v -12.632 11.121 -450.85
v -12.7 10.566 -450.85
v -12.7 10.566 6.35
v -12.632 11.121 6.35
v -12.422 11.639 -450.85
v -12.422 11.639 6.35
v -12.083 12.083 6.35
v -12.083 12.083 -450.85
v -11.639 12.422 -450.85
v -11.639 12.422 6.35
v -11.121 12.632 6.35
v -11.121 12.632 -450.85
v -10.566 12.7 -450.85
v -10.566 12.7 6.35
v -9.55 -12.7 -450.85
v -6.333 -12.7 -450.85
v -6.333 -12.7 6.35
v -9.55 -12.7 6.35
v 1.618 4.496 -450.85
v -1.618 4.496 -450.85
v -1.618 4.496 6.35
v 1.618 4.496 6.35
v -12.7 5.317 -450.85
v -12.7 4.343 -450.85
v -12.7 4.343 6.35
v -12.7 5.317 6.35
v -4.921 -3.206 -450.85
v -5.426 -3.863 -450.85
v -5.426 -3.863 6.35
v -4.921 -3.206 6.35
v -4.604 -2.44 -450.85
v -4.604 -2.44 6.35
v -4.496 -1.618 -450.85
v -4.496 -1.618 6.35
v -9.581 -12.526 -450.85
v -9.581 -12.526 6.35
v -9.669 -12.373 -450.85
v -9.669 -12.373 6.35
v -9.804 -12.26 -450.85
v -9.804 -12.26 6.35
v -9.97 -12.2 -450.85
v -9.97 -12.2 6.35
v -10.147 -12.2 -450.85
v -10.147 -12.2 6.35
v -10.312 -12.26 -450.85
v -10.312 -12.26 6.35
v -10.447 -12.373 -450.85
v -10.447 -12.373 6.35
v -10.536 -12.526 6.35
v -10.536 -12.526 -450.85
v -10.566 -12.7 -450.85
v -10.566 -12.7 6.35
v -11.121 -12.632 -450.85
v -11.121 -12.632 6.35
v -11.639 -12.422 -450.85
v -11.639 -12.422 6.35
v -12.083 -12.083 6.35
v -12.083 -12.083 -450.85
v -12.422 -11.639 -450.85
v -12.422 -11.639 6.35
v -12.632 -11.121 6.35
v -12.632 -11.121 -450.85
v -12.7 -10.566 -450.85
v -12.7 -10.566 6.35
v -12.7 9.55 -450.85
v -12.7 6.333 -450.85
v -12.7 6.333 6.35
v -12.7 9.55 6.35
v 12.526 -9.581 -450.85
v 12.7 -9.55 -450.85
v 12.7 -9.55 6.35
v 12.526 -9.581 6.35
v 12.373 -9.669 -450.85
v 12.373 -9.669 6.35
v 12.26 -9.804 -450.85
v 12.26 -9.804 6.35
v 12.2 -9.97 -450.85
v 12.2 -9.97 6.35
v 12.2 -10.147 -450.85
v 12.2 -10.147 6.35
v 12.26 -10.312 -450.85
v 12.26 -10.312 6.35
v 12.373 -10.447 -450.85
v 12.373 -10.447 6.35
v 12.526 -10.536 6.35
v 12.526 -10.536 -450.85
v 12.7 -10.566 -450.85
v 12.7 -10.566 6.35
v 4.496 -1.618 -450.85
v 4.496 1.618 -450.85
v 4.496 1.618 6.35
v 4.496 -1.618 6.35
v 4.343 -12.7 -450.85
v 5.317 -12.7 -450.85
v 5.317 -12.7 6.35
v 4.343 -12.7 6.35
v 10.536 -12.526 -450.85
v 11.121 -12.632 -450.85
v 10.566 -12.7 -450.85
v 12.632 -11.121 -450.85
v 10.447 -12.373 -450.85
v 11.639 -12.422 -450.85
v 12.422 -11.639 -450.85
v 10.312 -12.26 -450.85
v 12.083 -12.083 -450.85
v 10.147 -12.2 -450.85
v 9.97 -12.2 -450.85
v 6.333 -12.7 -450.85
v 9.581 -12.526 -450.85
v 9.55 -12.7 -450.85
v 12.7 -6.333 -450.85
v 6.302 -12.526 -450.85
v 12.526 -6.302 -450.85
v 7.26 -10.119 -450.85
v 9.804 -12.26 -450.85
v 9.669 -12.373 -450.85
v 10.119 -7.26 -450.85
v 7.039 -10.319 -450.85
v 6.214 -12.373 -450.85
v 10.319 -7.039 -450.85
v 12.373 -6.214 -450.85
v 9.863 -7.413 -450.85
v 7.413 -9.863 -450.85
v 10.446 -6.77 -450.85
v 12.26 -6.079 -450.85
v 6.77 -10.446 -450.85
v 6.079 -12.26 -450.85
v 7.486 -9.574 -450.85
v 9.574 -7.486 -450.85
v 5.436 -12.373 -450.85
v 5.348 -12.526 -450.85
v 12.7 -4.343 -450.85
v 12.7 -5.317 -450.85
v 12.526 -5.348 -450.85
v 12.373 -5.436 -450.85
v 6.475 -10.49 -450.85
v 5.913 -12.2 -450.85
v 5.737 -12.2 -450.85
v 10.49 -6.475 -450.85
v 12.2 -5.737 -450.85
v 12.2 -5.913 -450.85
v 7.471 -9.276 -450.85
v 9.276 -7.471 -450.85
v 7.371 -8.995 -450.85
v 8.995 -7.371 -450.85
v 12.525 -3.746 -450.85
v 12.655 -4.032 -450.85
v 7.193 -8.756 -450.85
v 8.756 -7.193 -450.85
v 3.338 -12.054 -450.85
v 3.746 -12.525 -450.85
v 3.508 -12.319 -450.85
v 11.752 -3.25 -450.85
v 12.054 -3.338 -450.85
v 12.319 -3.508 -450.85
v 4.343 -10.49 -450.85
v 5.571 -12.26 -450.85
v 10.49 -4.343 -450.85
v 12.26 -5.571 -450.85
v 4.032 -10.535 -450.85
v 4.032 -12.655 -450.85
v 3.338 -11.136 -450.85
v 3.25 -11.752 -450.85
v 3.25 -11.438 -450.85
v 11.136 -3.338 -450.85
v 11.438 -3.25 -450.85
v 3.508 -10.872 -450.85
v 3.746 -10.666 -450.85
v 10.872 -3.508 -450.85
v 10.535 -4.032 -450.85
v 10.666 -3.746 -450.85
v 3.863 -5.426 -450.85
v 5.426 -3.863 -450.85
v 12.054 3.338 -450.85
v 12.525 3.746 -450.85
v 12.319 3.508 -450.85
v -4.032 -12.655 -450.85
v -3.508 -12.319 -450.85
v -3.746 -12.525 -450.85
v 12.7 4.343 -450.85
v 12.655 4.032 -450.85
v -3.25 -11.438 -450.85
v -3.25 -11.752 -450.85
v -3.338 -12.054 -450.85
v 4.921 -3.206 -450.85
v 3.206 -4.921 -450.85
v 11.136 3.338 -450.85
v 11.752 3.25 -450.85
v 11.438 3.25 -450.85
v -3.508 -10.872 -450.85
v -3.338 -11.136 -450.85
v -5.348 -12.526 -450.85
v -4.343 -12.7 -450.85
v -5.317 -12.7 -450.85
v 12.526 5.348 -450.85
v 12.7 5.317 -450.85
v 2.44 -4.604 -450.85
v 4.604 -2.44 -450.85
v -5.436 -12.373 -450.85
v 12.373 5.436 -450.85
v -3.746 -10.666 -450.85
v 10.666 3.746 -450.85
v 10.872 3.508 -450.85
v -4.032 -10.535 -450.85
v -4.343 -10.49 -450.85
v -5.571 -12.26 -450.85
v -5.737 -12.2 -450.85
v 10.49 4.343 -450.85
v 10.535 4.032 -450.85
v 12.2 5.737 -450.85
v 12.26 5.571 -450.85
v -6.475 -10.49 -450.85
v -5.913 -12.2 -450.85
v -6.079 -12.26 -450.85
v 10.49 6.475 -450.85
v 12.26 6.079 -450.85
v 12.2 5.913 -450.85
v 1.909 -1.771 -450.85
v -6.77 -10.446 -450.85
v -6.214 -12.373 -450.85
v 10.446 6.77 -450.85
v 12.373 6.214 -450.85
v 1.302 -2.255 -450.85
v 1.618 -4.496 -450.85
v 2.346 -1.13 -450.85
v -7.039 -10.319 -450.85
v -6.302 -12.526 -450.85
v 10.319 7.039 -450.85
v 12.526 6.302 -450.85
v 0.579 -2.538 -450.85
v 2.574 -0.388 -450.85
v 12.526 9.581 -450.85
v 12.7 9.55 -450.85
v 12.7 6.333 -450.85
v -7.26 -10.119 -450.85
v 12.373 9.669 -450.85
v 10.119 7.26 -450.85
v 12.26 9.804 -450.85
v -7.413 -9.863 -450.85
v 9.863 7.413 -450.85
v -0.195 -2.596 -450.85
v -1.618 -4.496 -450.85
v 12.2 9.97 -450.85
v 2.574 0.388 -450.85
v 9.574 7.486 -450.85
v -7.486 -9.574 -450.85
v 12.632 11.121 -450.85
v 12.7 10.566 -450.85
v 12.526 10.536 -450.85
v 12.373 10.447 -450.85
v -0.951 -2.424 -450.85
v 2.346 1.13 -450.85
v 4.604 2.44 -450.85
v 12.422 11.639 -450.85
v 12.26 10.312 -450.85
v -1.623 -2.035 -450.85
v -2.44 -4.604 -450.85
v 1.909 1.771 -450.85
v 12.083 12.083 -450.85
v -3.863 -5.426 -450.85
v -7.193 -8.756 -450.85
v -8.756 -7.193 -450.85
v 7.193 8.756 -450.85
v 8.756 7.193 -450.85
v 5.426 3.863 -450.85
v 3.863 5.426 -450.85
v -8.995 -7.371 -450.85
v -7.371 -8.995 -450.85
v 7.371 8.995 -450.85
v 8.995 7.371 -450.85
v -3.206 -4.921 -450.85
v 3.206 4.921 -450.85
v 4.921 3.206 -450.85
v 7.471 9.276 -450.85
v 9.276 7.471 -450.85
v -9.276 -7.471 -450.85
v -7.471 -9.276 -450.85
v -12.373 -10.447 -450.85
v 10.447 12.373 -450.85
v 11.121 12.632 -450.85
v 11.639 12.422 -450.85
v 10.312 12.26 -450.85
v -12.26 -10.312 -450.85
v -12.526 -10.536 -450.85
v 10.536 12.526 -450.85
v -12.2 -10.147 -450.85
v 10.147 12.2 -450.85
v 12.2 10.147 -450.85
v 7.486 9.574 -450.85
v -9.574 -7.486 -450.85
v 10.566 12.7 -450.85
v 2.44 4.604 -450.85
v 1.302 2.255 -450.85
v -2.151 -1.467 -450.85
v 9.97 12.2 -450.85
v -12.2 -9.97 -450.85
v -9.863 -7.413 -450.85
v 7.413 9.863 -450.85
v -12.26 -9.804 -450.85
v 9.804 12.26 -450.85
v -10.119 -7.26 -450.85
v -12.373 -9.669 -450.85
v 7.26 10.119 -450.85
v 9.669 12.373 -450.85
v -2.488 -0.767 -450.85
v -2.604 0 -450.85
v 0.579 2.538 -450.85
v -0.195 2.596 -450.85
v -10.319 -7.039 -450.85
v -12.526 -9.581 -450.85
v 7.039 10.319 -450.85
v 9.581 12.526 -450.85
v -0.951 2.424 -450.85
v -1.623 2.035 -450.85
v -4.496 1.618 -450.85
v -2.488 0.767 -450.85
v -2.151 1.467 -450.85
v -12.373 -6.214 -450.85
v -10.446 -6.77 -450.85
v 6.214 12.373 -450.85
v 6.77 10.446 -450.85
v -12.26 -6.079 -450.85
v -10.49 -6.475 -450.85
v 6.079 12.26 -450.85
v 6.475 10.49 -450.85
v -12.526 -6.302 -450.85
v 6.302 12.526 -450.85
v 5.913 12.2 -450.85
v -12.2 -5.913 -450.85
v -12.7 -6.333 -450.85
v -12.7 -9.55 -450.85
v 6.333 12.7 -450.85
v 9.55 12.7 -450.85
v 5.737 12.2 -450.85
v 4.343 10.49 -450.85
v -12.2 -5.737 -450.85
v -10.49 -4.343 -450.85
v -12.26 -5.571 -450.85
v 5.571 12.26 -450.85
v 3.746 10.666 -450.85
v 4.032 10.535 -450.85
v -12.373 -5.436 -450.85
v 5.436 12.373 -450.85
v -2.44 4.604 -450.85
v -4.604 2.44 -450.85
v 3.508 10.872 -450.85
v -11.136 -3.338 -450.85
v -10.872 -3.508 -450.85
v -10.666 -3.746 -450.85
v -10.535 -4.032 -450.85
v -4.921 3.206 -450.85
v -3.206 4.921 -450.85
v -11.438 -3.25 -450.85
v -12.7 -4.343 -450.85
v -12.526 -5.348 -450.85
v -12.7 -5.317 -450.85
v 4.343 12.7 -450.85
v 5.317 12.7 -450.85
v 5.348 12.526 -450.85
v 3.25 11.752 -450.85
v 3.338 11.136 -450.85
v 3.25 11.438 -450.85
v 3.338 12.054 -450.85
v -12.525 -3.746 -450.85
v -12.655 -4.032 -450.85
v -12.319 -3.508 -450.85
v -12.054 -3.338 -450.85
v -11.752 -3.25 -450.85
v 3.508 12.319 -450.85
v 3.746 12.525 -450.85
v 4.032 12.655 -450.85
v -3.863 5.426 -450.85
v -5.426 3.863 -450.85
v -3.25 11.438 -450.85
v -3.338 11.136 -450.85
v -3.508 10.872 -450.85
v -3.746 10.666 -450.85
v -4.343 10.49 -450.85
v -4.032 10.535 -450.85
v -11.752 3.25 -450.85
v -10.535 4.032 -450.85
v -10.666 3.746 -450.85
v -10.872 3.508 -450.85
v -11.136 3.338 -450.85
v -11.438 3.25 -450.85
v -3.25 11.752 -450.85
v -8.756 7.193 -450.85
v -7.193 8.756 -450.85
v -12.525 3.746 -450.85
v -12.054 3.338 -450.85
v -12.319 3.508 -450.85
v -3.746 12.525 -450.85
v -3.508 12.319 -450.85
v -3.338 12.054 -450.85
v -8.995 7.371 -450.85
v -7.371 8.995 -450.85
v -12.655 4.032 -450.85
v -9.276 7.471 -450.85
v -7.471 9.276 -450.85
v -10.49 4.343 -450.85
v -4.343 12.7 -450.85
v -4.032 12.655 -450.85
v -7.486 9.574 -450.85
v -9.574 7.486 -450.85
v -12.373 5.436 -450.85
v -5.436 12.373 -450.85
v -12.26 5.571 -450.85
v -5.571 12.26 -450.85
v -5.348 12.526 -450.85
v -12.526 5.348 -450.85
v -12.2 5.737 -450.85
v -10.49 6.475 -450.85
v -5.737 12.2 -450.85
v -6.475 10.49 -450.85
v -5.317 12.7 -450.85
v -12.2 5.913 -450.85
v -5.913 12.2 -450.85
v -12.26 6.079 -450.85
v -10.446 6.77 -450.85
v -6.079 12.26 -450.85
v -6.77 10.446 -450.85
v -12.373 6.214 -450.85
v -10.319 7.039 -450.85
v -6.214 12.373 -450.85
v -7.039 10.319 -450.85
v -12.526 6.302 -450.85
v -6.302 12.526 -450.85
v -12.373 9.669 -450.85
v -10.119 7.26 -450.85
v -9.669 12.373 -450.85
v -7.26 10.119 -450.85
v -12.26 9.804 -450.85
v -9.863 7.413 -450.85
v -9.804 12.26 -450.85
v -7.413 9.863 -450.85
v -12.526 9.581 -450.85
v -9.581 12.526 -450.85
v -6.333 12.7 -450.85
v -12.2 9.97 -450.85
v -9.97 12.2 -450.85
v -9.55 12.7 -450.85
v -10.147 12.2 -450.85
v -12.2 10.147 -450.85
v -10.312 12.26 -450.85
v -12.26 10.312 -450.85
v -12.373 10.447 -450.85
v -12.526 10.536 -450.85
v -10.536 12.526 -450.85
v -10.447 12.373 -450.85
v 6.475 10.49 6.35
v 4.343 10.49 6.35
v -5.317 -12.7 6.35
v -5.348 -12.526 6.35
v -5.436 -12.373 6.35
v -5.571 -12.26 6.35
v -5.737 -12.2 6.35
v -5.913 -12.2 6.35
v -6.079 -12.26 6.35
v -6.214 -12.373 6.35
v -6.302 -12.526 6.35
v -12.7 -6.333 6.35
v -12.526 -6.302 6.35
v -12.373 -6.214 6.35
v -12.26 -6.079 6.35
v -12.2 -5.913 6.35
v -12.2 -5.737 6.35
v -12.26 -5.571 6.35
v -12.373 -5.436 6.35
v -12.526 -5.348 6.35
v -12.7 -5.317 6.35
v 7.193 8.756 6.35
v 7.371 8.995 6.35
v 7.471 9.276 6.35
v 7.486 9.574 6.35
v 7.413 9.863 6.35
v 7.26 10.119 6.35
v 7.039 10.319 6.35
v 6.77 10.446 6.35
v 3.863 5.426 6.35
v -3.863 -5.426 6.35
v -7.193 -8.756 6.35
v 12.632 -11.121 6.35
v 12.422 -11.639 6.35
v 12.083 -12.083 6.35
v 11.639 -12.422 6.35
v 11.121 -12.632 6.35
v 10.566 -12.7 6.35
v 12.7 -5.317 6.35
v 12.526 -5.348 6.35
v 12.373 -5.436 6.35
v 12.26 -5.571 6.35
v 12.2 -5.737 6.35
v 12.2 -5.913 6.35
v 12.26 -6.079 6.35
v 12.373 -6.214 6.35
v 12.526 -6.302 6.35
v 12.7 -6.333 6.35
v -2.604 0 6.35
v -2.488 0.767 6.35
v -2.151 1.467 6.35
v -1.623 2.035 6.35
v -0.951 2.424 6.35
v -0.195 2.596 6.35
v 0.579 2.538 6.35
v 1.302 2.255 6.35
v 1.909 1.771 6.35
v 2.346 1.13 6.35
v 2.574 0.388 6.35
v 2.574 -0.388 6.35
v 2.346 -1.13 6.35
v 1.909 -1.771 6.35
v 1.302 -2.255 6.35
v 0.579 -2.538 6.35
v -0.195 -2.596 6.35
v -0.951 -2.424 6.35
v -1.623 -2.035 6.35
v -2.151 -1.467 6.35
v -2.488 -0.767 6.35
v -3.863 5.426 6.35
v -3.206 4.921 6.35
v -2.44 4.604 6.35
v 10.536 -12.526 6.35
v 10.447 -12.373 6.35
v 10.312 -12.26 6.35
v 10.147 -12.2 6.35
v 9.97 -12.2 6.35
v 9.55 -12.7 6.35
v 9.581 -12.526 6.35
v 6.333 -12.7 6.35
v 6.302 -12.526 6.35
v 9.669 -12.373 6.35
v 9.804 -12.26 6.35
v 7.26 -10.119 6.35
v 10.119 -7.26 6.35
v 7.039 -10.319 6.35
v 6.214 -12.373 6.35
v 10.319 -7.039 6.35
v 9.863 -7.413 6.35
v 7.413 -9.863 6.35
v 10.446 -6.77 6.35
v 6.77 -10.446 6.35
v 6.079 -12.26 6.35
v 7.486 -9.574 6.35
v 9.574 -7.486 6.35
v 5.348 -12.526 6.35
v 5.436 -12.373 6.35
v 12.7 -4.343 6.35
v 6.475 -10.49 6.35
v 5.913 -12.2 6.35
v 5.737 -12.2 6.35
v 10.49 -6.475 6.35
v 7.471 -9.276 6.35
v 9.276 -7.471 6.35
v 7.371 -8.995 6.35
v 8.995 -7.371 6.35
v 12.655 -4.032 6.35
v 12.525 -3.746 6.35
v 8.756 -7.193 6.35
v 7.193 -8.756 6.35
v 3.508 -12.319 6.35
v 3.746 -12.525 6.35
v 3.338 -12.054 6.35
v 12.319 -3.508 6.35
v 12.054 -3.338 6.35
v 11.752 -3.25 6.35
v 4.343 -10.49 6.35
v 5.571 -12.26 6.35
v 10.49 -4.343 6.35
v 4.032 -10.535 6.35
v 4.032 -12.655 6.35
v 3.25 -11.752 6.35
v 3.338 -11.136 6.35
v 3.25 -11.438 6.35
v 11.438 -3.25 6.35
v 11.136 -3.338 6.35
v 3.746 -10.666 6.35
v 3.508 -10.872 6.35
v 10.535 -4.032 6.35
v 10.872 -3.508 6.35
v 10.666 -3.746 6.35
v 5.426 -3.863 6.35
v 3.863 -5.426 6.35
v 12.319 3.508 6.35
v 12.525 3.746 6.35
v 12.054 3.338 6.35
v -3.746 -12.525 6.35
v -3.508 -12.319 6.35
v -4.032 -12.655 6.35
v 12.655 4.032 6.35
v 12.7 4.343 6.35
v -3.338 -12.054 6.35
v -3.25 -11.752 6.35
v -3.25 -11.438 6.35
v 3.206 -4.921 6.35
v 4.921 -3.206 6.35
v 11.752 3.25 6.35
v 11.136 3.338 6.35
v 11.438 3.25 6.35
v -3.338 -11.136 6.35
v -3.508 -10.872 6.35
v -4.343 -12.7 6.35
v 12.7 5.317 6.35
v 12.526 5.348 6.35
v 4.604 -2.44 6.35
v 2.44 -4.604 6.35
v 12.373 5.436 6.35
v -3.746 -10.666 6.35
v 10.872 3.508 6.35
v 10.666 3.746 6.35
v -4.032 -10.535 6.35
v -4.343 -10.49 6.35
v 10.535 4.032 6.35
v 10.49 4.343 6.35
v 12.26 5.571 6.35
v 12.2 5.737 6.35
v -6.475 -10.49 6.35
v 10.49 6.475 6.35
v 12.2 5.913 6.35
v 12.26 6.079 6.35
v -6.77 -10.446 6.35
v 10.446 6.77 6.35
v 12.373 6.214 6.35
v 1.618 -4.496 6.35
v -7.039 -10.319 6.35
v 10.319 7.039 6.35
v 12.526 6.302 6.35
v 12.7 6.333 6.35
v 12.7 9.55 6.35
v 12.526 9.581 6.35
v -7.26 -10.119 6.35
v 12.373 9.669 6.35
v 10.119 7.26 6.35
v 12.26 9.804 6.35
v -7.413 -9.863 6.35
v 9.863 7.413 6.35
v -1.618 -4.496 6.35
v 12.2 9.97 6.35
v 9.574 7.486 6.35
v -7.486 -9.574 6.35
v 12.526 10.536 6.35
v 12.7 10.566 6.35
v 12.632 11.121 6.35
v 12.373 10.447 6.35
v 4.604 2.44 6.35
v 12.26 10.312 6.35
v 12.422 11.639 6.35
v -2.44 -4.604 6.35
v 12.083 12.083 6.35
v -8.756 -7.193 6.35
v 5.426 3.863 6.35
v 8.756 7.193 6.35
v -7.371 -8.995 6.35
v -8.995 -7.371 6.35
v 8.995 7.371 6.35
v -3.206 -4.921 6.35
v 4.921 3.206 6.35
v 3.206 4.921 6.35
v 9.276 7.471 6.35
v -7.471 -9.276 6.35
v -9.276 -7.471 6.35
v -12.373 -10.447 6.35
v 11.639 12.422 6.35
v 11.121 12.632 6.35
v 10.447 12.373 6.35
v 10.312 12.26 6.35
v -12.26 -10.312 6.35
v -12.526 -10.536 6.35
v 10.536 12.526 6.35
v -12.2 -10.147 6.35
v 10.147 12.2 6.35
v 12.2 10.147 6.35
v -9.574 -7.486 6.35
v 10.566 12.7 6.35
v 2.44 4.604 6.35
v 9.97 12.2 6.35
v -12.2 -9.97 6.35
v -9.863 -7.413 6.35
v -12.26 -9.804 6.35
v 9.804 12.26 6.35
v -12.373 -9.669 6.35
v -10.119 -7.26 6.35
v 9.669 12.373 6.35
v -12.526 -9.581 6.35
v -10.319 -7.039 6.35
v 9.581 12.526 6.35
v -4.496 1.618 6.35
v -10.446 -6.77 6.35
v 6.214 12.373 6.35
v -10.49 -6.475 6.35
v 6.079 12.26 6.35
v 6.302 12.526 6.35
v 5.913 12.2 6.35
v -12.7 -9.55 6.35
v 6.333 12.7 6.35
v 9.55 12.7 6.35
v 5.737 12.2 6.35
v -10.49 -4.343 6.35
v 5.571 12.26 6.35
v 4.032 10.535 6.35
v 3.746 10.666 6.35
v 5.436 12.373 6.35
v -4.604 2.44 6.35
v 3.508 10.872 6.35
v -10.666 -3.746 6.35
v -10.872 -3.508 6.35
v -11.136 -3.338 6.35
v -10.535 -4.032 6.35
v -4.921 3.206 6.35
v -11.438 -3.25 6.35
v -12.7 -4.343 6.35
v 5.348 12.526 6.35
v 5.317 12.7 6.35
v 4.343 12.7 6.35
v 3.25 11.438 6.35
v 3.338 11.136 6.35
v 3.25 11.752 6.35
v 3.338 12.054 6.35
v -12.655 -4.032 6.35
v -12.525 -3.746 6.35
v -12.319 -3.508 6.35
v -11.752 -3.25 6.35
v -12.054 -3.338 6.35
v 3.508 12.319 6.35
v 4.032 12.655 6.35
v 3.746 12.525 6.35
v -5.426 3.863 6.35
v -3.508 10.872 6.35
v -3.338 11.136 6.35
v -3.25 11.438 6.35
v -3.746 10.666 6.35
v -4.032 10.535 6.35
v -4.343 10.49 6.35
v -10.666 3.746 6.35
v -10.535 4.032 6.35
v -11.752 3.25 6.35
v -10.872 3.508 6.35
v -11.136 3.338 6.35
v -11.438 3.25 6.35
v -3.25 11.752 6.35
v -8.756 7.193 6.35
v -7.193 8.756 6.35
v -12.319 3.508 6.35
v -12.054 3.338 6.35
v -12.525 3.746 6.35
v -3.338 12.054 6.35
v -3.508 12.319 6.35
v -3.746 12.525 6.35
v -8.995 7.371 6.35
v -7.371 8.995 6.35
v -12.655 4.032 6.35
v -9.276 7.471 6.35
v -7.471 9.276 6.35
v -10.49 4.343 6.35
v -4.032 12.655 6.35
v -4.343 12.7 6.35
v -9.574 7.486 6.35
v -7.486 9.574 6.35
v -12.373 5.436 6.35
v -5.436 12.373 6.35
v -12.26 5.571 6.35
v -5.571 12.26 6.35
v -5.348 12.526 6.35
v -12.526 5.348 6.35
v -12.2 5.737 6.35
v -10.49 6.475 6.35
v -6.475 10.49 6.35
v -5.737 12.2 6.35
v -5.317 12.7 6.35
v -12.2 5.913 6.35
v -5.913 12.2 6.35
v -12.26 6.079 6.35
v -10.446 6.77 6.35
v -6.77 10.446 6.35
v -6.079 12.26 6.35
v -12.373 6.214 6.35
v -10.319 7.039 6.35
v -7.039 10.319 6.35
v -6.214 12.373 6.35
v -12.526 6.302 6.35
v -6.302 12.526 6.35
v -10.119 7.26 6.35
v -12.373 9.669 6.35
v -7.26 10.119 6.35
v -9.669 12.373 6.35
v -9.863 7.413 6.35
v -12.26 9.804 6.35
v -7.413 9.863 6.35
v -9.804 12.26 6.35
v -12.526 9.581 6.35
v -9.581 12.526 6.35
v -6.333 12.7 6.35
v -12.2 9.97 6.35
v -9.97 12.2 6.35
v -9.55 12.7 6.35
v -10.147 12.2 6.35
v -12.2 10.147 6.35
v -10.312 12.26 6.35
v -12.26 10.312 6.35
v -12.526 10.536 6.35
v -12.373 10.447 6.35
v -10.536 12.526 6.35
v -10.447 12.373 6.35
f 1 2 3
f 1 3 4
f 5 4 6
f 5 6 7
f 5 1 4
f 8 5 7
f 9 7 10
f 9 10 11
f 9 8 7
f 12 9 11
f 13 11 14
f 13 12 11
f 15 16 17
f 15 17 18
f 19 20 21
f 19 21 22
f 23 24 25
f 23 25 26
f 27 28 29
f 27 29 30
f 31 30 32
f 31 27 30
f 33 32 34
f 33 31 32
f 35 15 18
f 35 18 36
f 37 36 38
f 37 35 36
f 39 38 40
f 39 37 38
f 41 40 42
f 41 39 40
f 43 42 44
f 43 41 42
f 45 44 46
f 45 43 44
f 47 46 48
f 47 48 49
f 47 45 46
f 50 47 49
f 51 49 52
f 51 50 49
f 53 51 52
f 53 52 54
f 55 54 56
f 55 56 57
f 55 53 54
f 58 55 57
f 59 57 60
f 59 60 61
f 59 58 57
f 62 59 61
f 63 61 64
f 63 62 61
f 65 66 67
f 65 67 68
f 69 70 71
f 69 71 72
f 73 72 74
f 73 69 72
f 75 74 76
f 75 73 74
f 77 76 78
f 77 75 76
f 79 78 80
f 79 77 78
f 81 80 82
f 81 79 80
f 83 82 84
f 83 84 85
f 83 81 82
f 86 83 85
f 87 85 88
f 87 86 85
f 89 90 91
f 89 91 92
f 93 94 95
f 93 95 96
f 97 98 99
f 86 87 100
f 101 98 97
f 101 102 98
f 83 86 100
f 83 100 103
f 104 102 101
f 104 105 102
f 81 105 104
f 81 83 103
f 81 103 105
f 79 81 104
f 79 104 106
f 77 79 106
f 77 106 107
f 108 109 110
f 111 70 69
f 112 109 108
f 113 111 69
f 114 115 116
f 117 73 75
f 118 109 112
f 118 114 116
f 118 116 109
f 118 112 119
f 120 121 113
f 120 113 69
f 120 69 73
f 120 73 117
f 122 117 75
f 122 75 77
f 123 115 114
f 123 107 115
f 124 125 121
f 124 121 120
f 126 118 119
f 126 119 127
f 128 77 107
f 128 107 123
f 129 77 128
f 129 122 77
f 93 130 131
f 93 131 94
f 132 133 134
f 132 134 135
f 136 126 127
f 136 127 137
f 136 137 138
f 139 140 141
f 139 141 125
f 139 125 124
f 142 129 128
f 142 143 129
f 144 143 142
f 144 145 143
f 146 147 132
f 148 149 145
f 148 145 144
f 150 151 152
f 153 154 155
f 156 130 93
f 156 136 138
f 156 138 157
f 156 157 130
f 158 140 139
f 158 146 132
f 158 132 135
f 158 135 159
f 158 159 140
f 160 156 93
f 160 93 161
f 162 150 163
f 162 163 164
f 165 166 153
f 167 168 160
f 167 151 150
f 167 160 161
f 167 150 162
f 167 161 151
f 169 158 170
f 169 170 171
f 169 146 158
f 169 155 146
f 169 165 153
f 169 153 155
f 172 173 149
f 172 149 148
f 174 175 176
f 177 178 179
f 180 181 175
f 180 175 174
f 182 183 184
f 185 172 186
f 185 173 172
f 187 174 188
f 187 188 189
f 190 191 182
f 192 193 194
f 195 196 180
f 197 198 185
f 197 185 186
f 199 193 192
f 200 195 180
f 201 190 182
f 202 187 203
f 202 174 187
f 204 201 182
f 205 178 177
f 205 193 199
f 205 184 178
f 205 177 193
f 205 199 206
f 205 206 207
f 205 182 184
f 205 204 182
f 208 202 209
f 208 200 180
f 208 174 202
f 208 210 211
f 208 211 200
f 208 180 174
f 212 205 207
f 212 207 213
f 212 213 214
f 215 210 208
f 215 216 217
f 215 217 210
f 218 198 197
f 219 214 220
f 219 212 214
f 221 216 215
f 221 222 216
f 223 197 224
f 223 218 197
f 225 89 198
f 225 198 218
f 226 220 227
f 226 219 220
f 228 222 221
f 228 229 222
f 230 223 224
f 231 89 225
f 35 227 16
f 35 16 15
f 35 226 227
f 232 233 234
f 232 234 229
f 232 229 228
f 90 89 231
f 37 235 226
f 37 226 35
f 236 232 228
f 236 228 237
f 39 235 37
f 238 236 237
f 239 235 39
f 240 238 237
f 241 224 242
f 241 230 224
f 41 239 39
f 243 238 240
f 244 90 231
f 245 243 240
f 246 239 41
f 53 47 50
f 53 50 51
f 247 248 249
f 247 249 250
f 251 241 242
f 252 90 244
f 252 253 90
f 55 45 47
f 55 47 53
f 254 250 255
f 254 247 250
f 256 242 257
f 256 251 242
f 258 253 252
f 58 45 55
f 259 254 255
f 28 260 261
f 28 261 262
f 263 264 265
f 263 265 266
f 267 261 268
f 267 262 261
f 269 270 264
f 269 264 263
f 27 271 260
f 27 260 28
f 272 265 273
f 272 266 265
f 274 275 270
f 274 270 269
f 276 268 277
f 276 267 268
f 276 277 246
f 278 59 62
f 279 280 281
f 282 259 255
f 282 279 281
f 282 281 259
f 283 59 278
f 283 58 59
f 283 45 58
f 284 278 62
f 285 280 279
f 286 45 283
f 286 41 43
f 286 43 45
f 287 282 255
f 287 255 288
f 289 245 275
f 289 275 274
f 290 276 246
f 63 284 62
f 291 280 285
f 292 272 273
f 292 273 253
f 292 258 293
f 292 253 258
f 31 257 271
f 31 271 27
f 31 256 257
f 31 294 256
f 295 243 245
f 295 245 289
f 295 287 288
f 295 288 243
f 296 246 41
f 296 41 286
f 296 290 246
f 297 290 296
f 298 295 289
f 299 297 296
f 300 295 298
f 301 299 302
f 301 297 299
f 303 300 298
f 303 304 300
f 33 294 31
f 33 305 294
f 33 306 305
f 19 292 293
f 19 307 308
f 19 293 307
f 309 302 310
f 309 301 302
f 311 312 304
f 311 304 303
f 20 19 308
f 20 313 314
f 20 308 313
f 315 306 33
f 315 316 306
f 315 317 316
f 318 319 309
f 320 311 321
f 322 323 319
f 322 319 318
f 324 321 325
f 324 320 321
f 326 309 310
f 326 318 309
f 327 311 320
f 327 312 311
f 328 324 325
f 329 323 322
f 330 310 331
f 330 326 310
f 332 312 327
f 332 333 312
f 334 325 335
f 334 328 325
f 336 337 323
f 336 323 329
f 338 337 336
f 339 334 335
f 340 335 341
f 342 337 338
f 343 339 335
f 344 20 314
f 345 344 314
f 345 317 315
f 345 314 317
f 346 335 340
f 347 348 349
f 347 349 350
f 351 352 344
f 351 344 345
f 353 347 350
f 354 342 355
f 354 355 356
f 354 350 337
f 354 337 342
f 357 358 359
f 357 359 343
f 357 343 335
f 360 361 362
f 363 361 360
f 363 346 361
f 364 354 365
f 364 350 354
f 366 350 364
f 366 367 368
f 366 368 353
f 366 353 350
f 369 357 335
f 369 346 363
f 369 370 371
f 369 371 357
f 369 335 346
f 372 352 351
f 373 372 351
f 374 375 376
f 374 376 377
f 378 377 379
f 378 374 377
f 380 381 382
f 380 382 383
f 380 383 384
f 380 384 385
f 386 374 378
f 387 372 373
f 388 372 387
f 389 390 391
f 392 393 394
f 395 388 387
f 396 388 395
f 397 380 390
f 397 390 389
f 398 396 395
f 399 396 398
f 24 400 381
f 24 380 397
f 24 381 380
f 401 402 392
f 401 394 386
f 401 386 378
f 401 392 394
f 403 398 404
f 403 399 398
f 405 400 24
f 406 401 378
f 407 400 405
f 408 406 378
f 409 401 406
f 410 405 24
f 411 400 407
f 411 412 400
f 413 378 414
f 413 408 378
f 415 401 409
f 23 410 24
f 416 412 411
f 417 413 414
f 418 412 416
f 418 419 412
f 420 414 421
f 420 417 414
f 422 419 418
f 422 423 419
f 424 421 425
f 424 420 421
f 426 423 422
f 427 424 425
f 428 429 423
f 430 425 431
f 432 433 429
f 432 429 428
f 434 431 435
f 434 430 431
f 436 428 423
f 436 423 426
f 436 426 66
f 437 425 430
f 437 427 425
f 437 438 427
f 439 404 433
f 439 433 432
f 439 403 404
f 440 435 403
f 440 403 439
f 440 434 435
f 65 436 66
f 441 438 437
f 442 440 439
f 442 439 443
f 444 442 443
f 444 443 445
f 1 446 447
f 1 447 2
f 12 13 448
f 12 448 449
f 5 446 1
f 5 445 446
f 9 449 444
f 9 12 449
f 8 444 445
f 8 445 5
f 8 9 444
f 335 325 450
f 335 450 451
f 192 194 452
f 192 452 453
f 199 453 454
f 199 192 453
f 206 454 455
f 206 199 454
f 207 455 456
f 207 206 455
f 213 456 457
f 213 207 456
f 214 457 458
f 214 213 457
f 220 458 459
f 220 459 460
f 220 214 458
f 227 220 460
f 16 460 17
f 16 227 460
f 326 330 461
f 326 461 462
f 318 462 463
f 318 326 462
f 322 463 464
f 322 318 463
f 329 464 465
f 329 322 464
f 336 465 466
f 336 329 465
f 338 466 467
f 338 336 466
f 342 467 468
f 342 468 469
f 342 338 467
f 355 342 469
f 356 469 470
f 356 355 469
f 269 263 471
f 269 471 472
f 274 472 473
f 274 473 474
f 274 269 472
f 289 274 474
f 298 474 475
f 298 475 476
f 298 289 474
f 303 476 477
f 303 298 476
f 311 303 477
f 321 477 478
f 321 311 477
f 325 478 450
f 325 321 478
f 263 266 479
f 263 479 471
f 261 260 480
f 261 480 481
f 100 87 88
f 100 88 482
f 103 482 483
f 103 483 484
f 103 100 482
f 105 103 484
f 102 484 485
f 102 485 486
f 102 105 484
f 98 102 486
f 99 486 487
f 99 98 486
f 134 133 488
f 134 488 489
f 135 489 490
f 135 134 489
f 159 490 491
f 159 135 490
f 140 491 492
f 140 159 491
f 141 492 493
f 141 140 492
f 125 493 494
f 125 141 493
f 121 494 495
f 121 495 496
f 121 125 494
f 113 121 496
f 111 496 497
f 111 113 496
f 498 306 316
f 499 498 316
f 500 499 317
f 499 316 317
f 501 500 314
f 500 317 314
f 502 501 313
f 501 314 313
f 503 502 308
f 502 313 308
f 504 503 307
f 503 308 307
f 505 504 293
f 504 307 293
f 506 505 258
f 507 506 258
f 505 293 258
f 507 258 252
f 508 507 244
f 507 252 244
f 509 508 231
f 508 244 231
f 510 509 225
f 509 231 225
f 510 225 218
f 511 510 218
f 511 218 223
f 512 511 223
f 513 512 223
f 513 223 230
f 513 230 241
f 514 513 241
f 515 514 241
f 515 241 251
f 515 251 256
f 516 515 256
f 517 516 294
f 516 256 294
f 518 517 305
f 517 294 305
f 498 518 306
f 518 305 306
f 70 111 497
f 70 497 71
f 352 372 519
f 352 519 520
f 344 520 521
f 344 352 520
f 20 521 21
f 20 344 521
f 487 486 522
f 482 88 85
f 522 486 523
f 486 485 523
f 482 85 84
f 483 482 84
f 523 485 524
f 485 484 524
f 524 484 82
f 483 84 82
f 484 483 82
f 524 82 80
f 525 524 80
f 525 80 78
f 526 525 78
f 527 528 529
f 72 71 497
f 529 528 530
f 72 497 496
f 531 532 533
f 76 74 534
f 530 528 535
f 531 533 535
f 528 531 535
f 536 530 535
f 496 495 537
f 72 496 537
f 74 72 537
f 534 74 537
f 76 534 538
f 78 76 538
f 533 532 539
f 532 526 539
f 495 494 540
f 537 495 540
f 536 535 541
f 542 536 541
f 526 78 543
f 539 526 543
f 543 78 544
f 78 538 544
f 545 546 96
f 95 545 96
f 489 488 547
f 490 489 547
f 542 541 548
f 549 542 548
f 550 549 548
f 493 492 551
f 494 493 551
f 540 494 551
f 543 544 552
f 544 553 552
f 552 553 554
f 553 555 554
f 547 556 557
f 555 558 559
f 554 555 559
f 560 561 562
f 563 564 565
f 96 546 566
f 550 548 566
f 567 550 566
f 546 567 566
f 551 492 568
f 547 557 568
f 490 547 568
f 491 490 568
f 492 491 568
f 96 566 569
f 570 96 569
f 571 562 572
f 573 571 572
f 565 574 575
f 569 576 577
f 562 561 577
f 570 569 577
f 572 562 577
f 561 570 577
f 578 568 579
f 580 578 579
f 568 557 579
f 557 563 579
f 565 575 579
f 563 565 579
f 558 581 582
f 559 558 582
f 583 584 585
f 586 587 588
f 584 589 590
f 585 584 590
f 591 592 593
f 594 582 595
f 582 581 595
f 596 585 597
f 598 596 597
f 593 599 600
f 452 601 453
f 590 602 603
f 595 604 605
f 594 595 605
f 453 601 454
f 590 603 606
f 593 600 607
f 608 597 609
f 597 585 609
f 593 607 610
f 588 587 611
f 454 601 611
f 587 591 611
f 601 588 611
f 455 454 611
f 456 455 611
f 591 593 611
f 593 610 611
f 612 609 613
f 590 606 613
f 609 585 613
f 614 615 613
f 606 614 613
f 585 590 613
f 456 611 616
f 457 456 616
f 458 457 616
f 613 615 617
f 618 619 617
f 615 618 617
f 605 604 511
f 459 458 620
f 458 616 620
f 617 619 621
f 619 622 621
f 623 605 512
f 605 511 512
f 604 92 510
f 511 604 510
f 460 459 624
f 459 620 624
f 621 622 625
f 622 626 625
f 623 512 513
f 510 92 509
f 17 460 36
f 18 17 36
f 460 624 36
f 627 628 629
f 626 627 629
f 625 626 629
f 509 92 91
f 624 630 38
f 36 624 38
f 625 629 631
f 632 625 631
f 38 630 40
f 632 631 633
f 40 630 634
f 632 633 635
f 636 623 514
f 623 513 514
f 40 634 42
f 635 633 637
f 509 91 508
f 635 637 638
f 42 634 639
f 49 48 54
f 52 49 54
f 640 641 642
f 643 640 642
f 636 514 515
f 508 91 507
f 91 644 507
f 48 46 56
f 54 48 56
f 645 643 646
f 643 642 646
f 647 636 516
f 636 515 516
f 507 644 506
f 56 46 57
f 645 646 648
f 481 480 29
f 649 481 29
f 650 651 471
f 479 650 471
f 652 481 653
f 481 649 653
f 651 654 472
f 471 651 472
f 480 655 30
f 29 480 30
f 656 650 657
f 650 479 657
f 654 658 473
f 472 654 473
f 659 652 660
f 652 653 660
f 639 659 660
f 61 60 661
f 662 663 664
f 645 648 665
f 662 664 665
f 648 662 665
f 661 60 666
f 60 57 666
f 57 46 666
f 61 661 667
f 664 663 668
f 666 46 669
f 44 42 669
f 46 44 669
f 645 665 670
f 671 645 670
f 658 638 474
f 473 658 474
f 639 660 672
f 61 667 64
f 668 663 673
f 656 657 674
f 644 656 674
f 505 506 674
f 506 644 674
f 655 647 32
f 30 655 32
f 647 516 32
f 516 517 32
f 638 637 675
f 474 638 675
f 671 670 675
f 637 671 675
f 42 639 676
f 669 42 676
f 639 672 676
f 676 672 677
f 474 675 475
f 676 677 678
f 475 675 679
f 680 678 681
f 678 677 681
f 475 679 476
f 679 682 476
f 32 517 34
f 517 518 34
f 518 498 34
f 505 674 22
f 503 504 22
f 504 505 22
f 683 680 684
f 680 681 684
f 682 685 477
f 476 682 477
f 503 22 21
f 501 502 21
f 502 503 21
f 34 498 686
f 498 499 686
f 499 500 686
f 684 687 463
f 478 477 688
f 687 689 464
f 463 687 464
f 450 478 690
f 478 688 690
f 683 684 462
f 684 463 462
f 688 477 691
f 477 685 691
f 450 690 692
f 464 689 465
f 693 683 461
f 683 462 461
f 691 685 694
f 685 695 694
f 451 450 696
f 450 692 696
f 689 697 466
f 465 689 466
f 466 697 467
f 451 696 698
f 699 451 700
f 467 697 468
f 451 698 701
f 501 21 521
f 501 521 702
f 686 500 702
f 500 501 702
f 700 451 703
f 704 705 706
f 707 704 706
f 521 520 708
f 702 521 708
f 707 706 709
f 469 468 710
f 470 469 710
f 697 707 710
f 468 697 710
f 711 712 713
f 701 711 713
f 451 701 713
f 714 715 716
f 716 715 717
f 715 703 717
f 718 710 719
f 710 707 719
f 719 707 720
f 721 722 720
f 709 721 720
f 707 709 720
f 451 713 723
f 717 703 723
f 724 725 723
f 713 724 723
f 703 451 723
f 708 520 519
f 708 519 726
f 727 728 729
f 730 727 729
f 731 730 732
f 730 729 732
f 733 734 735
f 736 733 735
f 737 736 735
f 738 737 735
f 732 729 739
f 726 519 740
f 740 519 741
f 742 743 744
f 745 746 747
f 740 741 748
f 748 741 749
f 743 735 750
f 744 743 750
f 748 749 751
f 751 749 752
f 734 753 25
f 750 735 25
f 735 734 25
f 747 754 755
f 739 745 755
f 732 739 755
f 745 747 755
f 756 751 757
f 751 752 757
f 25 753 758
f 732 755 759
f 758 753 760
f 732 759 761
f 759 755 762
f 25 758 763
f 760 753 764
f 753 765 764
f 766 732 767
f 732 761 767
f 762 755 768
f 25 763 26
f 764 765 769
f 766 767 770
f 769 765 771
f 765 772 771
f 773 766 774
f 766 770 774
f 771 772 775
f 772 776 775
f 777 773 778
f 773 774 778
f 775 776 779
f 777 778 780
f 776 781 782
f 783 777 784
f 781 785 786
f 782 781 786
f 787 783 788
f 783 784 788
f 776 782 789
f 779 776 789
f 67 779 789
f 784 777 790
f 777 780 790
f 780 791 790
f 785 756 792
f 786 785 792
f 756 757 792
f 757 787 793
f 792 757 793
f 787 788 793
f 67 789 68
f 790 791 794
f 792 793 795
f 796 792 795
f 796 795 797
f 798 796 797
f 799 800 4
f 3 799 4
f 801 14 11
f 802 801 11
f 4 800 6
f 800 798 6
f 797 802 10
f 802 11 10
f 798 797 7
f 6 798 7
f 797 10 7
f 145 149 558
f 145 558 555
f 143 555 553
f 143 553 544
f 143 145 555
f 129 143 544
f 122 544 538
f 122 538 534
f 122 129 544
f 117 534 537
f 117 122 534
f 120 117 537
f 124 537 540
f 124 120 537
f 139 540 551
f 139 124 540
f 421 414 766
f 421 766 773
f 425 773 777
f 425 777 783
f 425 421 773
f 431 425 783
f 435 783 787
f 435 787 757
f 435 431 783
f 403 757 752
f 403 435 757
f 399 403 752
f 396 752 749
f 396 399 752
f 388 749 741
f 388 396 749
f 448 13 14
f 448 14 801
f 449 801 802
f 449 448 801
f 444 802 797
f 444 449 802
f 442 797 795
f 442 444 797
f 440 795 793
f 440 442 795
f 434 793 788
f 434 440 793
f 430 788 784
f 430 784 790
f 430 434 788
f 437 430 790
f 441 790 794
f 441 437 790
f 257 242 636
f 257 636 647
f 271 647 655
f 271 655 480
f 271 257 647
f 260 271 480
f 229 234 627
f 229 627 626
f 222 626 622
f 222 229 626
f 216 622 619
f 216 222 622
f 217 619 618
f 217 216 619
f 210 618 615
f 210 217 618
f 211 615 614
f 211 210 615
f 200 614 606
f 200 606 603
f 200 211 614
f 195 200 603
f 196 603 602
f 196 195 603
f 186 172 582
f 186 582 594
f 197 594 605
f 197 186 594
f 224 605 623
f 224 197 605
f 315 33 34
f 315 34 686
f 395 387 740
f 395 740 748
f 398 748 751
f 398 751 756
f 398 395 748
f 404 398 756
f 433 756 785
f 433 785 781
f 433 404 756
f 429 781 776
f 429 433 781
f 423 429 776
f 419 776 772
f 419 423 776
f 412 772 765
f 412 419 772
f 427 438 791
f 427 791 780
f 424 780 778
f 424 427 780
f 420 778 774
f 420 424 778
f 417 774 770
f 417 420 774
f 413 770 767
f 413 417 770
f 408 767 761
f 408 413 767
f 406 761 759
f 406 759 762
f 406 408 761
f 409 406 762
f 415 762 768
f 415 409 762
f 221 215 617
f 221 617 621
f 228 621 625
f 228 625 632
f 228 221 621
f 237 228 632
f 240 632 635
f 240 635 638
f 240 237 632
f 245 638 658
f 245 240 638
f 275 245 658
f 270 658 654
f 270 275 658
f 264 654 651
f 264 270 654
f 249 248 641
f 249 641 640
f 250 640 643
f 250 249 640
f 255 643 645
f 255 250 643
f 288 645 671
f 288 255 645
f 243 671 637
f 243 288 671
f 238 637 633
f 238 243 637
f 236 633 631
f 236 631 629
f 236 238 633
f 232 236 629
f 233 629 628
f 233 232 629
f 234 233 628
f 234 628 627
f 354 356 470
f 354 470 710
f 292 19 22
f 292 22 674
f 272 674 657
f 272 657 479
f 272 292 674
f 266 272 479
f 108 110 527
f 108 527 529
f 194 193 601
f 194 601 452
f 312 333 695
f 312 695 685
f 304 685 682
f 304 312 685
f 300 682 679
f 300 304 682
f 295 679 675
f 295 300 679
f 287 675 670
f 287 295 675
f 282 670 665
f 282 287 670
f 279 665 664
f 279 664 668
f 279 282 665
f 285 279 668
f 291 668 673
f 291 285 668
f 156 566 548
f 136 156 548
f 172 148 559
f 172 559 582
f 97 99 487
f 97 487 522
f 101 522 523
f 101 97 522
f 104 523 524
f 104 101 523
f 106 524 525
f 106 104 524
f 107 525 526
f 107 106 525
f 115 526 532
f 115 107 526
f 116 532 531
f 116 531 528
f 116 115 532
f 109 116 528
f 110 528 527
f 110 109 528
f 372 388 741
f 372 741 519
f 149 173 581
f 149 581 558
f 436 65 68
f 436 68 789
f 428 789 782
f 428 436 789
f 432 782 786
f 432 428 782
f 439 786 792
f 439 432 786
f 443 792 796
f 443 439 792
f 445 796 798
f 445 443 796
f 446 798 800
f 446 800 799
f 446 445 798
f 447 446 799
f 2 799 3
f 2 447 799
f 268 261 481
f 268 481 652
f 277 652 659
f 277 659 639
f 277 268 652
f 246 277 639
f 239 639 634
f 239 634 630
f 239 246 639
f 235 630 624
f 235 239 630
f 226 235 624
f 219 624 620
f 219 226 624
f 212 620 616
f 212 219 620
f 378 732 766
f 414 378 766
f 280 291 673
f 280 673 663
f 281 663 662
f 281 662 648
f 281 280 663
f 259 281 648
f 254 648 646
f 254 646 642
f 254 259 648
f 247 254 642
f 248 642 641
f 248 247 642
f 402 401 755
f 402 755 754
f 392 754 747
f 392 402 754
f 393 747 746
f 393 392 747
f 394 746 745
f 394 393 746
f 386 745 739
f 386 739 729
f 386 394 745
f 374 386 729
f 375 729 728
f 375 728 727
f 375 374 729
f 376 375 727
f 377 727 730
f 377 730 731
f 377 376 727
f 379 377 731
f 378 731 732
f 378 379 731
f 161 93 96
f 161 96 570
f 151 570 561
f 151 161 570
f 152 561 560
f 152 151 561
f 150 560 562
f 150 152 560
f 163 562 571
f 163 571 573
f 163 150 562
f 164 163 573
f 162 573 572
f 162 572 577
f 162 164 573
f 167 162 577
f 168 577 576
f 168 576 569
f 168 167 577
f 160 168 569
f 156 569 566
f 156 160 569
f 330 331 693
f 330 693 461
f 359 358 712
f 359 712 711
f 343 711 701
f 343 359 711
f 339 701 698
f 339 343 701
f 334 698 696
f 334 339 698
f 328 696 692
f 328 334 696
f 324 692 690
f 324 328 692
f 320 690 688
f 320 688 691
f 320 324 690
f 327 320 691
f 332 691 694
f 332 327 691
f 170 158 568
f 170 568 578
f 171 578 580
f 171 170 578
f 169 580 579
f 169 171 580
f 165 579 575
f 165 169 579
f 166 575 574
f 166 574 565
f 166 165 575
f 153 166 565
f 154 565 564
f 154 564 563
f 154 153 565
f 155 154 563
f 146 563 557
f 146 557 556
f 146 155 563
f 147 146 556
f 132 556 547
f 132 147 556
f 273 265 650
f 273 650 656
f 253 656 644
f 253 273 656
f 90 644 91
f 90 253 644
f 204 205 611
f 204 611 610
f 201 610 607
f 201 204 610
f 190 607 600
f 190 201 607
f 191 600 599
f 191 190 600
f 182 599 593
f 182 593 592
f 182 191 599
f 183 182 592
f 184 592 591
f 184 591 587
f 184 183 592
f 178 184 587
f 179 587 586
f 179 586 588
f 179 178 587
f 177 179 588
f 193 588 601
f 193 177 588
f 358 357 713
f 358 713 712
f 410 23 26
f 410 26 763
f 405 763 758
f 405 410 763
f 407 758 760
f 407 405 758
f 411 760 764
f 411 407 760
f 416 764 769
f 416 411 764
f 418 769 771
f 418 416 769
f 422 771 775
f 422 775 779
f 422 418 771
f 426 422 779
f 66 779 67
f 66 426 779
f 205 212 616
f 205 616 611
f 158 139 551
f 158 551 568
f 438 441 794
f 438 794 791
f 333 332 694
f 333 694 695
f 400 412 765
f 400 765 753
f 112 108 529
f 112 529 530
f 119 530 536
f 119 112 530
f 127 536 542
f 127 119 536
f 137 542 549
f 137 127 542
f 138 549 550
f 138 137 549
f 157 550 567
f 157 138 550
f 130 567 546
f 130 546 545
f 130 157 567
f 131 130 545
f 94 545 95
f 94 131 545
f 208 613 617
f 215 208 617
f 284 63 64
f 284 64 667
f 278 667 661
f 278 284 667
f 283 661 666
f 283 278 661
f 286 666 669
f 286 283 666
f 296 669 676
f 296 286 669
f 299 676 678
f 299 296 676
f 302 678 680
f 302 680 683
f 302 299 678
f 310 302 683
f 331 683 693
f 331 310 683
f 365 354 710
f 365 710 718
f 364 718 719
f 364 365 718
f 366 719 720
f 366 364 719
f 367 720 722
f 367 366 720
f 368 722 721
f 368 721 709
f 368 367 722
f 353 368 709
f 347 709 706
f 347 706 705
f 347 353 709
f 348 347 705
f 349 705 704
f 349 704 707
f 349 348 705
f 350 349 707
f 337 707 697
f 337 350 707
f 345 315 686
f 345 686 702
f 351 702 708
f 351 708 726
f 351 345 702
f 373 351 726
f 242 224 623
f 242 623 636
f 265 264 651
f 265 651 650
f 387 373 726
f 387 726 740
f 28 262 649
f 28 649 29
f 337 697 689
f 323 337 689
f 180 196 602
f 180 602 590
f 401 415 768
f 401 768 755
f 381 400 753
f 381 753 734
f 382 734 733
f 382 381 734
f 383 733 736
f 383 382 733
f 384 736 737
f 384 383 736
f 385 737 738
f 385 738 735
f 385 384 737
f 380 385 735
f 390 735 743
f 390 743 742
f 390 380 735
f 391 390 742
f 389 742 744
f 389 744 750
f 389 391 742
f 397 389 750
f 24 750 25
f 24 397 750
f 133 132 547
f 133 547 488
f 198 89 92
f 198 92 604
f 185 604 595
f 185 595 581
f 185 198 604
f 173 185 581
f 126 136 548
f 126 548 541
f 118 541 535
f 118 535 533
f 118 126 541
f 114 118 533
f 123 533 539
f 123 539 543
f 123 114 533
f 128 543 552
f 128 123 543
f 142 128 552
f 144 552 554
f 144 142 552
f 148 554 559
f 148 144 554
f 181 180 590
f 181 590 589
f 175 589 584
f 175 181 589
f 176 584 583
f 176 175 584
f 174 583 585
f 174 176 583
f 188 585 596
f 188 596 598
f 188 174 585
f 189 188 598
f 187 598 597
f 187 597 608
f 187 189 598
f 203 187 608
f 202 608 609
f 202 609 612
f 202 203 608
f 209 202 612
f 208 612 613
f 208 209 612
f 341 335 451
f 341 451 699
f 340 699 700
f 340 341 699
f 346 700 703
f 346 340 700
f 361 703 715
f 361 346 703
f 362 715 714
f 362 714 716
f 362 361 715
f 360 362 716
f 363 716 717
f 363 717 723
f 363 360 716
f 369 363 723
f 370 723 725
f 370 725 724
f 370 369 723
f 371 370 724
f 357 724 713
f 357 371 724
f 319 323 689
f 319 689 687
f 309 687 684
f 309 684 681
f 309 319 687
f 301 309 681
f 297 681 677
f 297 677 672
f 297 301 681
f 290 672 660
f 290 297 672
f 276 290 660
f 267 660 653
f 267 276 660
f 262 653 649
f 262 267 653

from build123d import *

# Parameters (mm, degrees)
SKETCH1_R           = 2.6035
BOSS_EXTRUDE1_DEPTH = 457.2


with BuildPart() as part:
    # Sketch1 → Boss-Extrude1 (new body)
    with BuildSketch(Plane(origin=(0, 0, -450.85), x_dir=(-1, 0, 0), z_dir=(0, 0, -1))):
        with BuildLine():
            Line((12.7, -9.5504), (12.7, -6.3330836))
            ThreePointArc((12.7, -6.3330836), (12.192, -5.8250836), (12.7, -5.3170836))
            Line((12.7, -5.3170836), (12.7, -4.3434))
            ThreePointArc((12.7, -4.3434), (11.5951, -3.2385), (10.4902, -4.3434))
            Line((10.4902, -4.3434), (10.4902, -6.474794456))
            ThreePointArc((10.4902, -6.474794456), (9.863006367, -7.413456061), (8.75577951, -7.193214945))
            Line((8.75577951, -7.193214945), (5.42573597, -3.863171405))
            ThreePointArc((5.42573597, -3.863171405), (4.737482484, -2.833127272), (4.4958, -1.618107374))
            Line((4.4958, -1.618107374), (4.4958, 1.618107374))
            ThreePointArc((4.4958, 1.618107374), (4.737482484, 2.833127272), (5.42573597, 3.863171405))
            Line((5.42573597, 3.863171405), (8.75577951, 7.193214945))
            ThreePointArc((8.75577951, 7.193214945), (9.863006367, 7.413456061), (10.4902, 6.474794456))
            Line((10.4902, 6.474794456), (10.4902, 4.343399971))
            ThreePointArc((10.4902, 4.343399971), (11.5951, 3.238499971), (12.7, 4.343399971))
            Line((12.7, 4.343399971), (12.7, 5.3170836))
            ThreePointArc((12.7, 5.3170836), (12.192, 5.8250836), (12.7, 6.3330836))
            Line((12.7, 6.3330836), (12.7, 9.5504))
            ThreePointArc((12.7, 9.5504), (12.192000006, 10.058323491), (12.699846982, 10.566399977))
            ThreePointArc((12.699846982, 10.566399977), (12.082522516, 12.082522516), (10.566399977, 12.699846982))
            ThreePointArc((10.566399977, 12.699846982), (10.058323491, 12.192000006), (9.5504, 12.7))
            Line((9.5504, 12.7), (6.3330836, 12.7))
            ThreePointArc((6.3330836, 12.7), (5.8250836, 12.192), (5.3170836, 12.7))
            Line((5.3170836, 12.7), (4.3434, 12.7))
            ThreePointArc((4.3434, 12.7), (3.2385, 11.5951), (4.3434, 10.4902))
            Line((4.3434, 10.4902), (6.474794456, 10.4902))
            ThreePointArc((6.474794456, 10.4902), (7.413456061, 9.863006367), (7.193214945, 8.75577951))
            Line((7.193214945, 8.75577951), (3.863171405, 5.42573597))
            ThreePointArc((3.863171405, 5.42573597), (2.833127272, 4.737482484), (1.618107374, 4.4958))
            Line((1.618107374, 4.4958), (-1.618107374, 4.4958))
            ThreePointArc((-1.618107374, 4.4958), (-2.833127272, 4.737482484), (-3.863171405, 5.42573597))
            Line((-3.863171405, 5.42573597), (-7.193214945, 8.75577951))
            ThreePointArc((-7.193214945, 8.75577951), (-7.413456061, 9.863006367), (-6.474794456, 10.4902))
            Line((-6.474794456, 10.4902), (-4.343399971, 10.4902))
            ThreePointArc((-4.343399971, 10.4902), (-3.238499971, 11.5951), (-4.343399971, 12.7))
            Line((-4.343399971, 12.7), (-5.3170836, 12.7))
            ThreePointArc((-5.3170836, 12.7), (-5.8250836, 12.192), (-6.3330836, 12.7))
            Line((-6.3330836, 12.7), (-9.5504, 12.7))
            ThreePointArc((-9.5504, 12.7), (-10.058323491, 12.192000006), (-10.566399977, 12.699846982))
            ThreePointArc((-10.566399977, 12.699846982), (-12.082522516, 12.082522516), (-12.699846982, 10.566399977))
            ThreePointArc((-12.699846982, 10.566399977), (-12.192000006, 10.058323491), (-12.7, 9.5504))
            Line((-12.7, 9.5504), (-12.7, 6.3330836))
            ThreePointArc((-12.7, 6.3330836), (-12.192, 5.8250836), (-12.7, 5.3170836))
            Line((-12.7, 5.3170836), (-12.7, 4.3434))
            ThreePointArc((-12.7, 4.3434), (-11.5951, 3.2385), (-10.4902, 4.3434))
            Line((-10.4902, 4.3434), (-10.4902, 6.474794456))
            ThreePointArc((-10.4902, 6.474794456), (-9.863006367, 7.413456061), (-8.75577951, 7.193214945))
            Line((-8.75577951, 7.193214945), (-5.42573597, 3.863171405))
            ThreePointArc((-5.42573597, 3.863171405), (-4.737482484, 2.833127272), (-4.4958, 1.618107374))
            Line((-4.4958, 1.618107374), (-4.4958, -1.618107374))
            ThreePointArc((-4.4958, -1.618107374), (-4.737482484, -2.833127272), (-5.42573597, -3.863171405))
            Line((-5.42573597, -3.863171405), (-8.75577951, -7.193214945))
            ThreePointArc((-8.75577951, -7.193214945), (-9.863006367, -7.413456061), (-10.4902, -6.474794456))
            Line((-10.4902, -6.474794456), (-10.4902, -4.343399971))
            ThreePointArc((-10.4902, -4.343399971), (-11.5951, -3.238499971), (-12.7, -4.343399971))
            Line((-12.7, -4.343399971), (-12.7, -5.3170836))
            ThreePointArc((-12.7, -5.3170836), (-12.192, -5.8250836), (-12.7, -6.3330836))
            Line((-12.7, -6.3330836), (-12.7, -9.5504))
            ThreePointArc((-12.7, -9.5504), (-12.192000006, -10.058323491), (-12.699846982, -10.566399977))
            ThreePointArc((-12.699846982, -10.566399977), (-12.082522516, -12.082522516), (-10.566399977, -12.699846982))
            ThreePointArc((-10.566399977, -12.699846982), (-10.058323491, -12.192000006), (-9.5504, -12.7))
            Line((-9.5504, -12.7), (-6.3330836, -12.7))
            ThreePointArc((-6.3330836, -12.7), (-5.8250836, -12.192), (-5.3170836, -12.7))
            Line((-5.3170836, -12.7), (-4.3434, -12.7))
            ThreePointArc((-4.3434, -12.7), (-3.2385, -11.5951), (-4.3434, -10.4902))
            Line((-4.3434, -10.4902), (-6.474794456, -10.4902))
            ThreePointArc((-6.474794456, -10.4902), (-7.413456061, -9.863006367), (-7.193214945, -8.75577951))
            Line((-7.193214945, -8.75577951), (-3.863171405, -5.42573597))
            ThreePointArc((-3.863171405, -5.42573597), (-2.833127272, -4.737482484), (-1.618107374, -4.4958))
            Line((-1.618107374, -4.4958), (1.618107374, -4.4958))
            ThreePointArc((1.618107374, -4.4958), (2.833127272, -4.737482484), (3.863171405, -5.42573597))
            Line((3.863171405, -5.42573597), (7.193214945, -8.75577951))
            ThreePointArc((7.193214945, -8.75577951), (7.413456061, -9.863006367), (6.474794456, -10.4902))
            Line((6.474794456, -10.4902), (4.343399971, -10.4902))
            ThreePointArc((4.343399971, -10.4902), (3.238499971, -11.5951), (4.343399971, -12.7))
            Line((4.343399971, -12.7), (5.3170836, -12.7))
            ThreePointArc((5.3170836, -12.7), (5.8250836, -12.192), (6.3330836, -12.7))
            Line((6.3330836, -12.7), (9.5504, -12.7))
            ThreePointArc((9.5504, -12.7), (10.058323491, -12.192000006), (10.566399977, -12.699846982))
            ThreePointArc((10.566399977, -12.699846982), (12.082522516, -12.082522516), (12.699846982, -10.566399977))
            ThreePointArc((12.699846982, -10.566399977), (12.192000006, -10.058323491), (12.7, -9.5504))
        make_face()
        Circle(SKETCH1_R, mode=Mode.SUBTRACT)
    extrude(amount=-BOSS_EXTRUDE1_DEPTH)


solid = part.part
